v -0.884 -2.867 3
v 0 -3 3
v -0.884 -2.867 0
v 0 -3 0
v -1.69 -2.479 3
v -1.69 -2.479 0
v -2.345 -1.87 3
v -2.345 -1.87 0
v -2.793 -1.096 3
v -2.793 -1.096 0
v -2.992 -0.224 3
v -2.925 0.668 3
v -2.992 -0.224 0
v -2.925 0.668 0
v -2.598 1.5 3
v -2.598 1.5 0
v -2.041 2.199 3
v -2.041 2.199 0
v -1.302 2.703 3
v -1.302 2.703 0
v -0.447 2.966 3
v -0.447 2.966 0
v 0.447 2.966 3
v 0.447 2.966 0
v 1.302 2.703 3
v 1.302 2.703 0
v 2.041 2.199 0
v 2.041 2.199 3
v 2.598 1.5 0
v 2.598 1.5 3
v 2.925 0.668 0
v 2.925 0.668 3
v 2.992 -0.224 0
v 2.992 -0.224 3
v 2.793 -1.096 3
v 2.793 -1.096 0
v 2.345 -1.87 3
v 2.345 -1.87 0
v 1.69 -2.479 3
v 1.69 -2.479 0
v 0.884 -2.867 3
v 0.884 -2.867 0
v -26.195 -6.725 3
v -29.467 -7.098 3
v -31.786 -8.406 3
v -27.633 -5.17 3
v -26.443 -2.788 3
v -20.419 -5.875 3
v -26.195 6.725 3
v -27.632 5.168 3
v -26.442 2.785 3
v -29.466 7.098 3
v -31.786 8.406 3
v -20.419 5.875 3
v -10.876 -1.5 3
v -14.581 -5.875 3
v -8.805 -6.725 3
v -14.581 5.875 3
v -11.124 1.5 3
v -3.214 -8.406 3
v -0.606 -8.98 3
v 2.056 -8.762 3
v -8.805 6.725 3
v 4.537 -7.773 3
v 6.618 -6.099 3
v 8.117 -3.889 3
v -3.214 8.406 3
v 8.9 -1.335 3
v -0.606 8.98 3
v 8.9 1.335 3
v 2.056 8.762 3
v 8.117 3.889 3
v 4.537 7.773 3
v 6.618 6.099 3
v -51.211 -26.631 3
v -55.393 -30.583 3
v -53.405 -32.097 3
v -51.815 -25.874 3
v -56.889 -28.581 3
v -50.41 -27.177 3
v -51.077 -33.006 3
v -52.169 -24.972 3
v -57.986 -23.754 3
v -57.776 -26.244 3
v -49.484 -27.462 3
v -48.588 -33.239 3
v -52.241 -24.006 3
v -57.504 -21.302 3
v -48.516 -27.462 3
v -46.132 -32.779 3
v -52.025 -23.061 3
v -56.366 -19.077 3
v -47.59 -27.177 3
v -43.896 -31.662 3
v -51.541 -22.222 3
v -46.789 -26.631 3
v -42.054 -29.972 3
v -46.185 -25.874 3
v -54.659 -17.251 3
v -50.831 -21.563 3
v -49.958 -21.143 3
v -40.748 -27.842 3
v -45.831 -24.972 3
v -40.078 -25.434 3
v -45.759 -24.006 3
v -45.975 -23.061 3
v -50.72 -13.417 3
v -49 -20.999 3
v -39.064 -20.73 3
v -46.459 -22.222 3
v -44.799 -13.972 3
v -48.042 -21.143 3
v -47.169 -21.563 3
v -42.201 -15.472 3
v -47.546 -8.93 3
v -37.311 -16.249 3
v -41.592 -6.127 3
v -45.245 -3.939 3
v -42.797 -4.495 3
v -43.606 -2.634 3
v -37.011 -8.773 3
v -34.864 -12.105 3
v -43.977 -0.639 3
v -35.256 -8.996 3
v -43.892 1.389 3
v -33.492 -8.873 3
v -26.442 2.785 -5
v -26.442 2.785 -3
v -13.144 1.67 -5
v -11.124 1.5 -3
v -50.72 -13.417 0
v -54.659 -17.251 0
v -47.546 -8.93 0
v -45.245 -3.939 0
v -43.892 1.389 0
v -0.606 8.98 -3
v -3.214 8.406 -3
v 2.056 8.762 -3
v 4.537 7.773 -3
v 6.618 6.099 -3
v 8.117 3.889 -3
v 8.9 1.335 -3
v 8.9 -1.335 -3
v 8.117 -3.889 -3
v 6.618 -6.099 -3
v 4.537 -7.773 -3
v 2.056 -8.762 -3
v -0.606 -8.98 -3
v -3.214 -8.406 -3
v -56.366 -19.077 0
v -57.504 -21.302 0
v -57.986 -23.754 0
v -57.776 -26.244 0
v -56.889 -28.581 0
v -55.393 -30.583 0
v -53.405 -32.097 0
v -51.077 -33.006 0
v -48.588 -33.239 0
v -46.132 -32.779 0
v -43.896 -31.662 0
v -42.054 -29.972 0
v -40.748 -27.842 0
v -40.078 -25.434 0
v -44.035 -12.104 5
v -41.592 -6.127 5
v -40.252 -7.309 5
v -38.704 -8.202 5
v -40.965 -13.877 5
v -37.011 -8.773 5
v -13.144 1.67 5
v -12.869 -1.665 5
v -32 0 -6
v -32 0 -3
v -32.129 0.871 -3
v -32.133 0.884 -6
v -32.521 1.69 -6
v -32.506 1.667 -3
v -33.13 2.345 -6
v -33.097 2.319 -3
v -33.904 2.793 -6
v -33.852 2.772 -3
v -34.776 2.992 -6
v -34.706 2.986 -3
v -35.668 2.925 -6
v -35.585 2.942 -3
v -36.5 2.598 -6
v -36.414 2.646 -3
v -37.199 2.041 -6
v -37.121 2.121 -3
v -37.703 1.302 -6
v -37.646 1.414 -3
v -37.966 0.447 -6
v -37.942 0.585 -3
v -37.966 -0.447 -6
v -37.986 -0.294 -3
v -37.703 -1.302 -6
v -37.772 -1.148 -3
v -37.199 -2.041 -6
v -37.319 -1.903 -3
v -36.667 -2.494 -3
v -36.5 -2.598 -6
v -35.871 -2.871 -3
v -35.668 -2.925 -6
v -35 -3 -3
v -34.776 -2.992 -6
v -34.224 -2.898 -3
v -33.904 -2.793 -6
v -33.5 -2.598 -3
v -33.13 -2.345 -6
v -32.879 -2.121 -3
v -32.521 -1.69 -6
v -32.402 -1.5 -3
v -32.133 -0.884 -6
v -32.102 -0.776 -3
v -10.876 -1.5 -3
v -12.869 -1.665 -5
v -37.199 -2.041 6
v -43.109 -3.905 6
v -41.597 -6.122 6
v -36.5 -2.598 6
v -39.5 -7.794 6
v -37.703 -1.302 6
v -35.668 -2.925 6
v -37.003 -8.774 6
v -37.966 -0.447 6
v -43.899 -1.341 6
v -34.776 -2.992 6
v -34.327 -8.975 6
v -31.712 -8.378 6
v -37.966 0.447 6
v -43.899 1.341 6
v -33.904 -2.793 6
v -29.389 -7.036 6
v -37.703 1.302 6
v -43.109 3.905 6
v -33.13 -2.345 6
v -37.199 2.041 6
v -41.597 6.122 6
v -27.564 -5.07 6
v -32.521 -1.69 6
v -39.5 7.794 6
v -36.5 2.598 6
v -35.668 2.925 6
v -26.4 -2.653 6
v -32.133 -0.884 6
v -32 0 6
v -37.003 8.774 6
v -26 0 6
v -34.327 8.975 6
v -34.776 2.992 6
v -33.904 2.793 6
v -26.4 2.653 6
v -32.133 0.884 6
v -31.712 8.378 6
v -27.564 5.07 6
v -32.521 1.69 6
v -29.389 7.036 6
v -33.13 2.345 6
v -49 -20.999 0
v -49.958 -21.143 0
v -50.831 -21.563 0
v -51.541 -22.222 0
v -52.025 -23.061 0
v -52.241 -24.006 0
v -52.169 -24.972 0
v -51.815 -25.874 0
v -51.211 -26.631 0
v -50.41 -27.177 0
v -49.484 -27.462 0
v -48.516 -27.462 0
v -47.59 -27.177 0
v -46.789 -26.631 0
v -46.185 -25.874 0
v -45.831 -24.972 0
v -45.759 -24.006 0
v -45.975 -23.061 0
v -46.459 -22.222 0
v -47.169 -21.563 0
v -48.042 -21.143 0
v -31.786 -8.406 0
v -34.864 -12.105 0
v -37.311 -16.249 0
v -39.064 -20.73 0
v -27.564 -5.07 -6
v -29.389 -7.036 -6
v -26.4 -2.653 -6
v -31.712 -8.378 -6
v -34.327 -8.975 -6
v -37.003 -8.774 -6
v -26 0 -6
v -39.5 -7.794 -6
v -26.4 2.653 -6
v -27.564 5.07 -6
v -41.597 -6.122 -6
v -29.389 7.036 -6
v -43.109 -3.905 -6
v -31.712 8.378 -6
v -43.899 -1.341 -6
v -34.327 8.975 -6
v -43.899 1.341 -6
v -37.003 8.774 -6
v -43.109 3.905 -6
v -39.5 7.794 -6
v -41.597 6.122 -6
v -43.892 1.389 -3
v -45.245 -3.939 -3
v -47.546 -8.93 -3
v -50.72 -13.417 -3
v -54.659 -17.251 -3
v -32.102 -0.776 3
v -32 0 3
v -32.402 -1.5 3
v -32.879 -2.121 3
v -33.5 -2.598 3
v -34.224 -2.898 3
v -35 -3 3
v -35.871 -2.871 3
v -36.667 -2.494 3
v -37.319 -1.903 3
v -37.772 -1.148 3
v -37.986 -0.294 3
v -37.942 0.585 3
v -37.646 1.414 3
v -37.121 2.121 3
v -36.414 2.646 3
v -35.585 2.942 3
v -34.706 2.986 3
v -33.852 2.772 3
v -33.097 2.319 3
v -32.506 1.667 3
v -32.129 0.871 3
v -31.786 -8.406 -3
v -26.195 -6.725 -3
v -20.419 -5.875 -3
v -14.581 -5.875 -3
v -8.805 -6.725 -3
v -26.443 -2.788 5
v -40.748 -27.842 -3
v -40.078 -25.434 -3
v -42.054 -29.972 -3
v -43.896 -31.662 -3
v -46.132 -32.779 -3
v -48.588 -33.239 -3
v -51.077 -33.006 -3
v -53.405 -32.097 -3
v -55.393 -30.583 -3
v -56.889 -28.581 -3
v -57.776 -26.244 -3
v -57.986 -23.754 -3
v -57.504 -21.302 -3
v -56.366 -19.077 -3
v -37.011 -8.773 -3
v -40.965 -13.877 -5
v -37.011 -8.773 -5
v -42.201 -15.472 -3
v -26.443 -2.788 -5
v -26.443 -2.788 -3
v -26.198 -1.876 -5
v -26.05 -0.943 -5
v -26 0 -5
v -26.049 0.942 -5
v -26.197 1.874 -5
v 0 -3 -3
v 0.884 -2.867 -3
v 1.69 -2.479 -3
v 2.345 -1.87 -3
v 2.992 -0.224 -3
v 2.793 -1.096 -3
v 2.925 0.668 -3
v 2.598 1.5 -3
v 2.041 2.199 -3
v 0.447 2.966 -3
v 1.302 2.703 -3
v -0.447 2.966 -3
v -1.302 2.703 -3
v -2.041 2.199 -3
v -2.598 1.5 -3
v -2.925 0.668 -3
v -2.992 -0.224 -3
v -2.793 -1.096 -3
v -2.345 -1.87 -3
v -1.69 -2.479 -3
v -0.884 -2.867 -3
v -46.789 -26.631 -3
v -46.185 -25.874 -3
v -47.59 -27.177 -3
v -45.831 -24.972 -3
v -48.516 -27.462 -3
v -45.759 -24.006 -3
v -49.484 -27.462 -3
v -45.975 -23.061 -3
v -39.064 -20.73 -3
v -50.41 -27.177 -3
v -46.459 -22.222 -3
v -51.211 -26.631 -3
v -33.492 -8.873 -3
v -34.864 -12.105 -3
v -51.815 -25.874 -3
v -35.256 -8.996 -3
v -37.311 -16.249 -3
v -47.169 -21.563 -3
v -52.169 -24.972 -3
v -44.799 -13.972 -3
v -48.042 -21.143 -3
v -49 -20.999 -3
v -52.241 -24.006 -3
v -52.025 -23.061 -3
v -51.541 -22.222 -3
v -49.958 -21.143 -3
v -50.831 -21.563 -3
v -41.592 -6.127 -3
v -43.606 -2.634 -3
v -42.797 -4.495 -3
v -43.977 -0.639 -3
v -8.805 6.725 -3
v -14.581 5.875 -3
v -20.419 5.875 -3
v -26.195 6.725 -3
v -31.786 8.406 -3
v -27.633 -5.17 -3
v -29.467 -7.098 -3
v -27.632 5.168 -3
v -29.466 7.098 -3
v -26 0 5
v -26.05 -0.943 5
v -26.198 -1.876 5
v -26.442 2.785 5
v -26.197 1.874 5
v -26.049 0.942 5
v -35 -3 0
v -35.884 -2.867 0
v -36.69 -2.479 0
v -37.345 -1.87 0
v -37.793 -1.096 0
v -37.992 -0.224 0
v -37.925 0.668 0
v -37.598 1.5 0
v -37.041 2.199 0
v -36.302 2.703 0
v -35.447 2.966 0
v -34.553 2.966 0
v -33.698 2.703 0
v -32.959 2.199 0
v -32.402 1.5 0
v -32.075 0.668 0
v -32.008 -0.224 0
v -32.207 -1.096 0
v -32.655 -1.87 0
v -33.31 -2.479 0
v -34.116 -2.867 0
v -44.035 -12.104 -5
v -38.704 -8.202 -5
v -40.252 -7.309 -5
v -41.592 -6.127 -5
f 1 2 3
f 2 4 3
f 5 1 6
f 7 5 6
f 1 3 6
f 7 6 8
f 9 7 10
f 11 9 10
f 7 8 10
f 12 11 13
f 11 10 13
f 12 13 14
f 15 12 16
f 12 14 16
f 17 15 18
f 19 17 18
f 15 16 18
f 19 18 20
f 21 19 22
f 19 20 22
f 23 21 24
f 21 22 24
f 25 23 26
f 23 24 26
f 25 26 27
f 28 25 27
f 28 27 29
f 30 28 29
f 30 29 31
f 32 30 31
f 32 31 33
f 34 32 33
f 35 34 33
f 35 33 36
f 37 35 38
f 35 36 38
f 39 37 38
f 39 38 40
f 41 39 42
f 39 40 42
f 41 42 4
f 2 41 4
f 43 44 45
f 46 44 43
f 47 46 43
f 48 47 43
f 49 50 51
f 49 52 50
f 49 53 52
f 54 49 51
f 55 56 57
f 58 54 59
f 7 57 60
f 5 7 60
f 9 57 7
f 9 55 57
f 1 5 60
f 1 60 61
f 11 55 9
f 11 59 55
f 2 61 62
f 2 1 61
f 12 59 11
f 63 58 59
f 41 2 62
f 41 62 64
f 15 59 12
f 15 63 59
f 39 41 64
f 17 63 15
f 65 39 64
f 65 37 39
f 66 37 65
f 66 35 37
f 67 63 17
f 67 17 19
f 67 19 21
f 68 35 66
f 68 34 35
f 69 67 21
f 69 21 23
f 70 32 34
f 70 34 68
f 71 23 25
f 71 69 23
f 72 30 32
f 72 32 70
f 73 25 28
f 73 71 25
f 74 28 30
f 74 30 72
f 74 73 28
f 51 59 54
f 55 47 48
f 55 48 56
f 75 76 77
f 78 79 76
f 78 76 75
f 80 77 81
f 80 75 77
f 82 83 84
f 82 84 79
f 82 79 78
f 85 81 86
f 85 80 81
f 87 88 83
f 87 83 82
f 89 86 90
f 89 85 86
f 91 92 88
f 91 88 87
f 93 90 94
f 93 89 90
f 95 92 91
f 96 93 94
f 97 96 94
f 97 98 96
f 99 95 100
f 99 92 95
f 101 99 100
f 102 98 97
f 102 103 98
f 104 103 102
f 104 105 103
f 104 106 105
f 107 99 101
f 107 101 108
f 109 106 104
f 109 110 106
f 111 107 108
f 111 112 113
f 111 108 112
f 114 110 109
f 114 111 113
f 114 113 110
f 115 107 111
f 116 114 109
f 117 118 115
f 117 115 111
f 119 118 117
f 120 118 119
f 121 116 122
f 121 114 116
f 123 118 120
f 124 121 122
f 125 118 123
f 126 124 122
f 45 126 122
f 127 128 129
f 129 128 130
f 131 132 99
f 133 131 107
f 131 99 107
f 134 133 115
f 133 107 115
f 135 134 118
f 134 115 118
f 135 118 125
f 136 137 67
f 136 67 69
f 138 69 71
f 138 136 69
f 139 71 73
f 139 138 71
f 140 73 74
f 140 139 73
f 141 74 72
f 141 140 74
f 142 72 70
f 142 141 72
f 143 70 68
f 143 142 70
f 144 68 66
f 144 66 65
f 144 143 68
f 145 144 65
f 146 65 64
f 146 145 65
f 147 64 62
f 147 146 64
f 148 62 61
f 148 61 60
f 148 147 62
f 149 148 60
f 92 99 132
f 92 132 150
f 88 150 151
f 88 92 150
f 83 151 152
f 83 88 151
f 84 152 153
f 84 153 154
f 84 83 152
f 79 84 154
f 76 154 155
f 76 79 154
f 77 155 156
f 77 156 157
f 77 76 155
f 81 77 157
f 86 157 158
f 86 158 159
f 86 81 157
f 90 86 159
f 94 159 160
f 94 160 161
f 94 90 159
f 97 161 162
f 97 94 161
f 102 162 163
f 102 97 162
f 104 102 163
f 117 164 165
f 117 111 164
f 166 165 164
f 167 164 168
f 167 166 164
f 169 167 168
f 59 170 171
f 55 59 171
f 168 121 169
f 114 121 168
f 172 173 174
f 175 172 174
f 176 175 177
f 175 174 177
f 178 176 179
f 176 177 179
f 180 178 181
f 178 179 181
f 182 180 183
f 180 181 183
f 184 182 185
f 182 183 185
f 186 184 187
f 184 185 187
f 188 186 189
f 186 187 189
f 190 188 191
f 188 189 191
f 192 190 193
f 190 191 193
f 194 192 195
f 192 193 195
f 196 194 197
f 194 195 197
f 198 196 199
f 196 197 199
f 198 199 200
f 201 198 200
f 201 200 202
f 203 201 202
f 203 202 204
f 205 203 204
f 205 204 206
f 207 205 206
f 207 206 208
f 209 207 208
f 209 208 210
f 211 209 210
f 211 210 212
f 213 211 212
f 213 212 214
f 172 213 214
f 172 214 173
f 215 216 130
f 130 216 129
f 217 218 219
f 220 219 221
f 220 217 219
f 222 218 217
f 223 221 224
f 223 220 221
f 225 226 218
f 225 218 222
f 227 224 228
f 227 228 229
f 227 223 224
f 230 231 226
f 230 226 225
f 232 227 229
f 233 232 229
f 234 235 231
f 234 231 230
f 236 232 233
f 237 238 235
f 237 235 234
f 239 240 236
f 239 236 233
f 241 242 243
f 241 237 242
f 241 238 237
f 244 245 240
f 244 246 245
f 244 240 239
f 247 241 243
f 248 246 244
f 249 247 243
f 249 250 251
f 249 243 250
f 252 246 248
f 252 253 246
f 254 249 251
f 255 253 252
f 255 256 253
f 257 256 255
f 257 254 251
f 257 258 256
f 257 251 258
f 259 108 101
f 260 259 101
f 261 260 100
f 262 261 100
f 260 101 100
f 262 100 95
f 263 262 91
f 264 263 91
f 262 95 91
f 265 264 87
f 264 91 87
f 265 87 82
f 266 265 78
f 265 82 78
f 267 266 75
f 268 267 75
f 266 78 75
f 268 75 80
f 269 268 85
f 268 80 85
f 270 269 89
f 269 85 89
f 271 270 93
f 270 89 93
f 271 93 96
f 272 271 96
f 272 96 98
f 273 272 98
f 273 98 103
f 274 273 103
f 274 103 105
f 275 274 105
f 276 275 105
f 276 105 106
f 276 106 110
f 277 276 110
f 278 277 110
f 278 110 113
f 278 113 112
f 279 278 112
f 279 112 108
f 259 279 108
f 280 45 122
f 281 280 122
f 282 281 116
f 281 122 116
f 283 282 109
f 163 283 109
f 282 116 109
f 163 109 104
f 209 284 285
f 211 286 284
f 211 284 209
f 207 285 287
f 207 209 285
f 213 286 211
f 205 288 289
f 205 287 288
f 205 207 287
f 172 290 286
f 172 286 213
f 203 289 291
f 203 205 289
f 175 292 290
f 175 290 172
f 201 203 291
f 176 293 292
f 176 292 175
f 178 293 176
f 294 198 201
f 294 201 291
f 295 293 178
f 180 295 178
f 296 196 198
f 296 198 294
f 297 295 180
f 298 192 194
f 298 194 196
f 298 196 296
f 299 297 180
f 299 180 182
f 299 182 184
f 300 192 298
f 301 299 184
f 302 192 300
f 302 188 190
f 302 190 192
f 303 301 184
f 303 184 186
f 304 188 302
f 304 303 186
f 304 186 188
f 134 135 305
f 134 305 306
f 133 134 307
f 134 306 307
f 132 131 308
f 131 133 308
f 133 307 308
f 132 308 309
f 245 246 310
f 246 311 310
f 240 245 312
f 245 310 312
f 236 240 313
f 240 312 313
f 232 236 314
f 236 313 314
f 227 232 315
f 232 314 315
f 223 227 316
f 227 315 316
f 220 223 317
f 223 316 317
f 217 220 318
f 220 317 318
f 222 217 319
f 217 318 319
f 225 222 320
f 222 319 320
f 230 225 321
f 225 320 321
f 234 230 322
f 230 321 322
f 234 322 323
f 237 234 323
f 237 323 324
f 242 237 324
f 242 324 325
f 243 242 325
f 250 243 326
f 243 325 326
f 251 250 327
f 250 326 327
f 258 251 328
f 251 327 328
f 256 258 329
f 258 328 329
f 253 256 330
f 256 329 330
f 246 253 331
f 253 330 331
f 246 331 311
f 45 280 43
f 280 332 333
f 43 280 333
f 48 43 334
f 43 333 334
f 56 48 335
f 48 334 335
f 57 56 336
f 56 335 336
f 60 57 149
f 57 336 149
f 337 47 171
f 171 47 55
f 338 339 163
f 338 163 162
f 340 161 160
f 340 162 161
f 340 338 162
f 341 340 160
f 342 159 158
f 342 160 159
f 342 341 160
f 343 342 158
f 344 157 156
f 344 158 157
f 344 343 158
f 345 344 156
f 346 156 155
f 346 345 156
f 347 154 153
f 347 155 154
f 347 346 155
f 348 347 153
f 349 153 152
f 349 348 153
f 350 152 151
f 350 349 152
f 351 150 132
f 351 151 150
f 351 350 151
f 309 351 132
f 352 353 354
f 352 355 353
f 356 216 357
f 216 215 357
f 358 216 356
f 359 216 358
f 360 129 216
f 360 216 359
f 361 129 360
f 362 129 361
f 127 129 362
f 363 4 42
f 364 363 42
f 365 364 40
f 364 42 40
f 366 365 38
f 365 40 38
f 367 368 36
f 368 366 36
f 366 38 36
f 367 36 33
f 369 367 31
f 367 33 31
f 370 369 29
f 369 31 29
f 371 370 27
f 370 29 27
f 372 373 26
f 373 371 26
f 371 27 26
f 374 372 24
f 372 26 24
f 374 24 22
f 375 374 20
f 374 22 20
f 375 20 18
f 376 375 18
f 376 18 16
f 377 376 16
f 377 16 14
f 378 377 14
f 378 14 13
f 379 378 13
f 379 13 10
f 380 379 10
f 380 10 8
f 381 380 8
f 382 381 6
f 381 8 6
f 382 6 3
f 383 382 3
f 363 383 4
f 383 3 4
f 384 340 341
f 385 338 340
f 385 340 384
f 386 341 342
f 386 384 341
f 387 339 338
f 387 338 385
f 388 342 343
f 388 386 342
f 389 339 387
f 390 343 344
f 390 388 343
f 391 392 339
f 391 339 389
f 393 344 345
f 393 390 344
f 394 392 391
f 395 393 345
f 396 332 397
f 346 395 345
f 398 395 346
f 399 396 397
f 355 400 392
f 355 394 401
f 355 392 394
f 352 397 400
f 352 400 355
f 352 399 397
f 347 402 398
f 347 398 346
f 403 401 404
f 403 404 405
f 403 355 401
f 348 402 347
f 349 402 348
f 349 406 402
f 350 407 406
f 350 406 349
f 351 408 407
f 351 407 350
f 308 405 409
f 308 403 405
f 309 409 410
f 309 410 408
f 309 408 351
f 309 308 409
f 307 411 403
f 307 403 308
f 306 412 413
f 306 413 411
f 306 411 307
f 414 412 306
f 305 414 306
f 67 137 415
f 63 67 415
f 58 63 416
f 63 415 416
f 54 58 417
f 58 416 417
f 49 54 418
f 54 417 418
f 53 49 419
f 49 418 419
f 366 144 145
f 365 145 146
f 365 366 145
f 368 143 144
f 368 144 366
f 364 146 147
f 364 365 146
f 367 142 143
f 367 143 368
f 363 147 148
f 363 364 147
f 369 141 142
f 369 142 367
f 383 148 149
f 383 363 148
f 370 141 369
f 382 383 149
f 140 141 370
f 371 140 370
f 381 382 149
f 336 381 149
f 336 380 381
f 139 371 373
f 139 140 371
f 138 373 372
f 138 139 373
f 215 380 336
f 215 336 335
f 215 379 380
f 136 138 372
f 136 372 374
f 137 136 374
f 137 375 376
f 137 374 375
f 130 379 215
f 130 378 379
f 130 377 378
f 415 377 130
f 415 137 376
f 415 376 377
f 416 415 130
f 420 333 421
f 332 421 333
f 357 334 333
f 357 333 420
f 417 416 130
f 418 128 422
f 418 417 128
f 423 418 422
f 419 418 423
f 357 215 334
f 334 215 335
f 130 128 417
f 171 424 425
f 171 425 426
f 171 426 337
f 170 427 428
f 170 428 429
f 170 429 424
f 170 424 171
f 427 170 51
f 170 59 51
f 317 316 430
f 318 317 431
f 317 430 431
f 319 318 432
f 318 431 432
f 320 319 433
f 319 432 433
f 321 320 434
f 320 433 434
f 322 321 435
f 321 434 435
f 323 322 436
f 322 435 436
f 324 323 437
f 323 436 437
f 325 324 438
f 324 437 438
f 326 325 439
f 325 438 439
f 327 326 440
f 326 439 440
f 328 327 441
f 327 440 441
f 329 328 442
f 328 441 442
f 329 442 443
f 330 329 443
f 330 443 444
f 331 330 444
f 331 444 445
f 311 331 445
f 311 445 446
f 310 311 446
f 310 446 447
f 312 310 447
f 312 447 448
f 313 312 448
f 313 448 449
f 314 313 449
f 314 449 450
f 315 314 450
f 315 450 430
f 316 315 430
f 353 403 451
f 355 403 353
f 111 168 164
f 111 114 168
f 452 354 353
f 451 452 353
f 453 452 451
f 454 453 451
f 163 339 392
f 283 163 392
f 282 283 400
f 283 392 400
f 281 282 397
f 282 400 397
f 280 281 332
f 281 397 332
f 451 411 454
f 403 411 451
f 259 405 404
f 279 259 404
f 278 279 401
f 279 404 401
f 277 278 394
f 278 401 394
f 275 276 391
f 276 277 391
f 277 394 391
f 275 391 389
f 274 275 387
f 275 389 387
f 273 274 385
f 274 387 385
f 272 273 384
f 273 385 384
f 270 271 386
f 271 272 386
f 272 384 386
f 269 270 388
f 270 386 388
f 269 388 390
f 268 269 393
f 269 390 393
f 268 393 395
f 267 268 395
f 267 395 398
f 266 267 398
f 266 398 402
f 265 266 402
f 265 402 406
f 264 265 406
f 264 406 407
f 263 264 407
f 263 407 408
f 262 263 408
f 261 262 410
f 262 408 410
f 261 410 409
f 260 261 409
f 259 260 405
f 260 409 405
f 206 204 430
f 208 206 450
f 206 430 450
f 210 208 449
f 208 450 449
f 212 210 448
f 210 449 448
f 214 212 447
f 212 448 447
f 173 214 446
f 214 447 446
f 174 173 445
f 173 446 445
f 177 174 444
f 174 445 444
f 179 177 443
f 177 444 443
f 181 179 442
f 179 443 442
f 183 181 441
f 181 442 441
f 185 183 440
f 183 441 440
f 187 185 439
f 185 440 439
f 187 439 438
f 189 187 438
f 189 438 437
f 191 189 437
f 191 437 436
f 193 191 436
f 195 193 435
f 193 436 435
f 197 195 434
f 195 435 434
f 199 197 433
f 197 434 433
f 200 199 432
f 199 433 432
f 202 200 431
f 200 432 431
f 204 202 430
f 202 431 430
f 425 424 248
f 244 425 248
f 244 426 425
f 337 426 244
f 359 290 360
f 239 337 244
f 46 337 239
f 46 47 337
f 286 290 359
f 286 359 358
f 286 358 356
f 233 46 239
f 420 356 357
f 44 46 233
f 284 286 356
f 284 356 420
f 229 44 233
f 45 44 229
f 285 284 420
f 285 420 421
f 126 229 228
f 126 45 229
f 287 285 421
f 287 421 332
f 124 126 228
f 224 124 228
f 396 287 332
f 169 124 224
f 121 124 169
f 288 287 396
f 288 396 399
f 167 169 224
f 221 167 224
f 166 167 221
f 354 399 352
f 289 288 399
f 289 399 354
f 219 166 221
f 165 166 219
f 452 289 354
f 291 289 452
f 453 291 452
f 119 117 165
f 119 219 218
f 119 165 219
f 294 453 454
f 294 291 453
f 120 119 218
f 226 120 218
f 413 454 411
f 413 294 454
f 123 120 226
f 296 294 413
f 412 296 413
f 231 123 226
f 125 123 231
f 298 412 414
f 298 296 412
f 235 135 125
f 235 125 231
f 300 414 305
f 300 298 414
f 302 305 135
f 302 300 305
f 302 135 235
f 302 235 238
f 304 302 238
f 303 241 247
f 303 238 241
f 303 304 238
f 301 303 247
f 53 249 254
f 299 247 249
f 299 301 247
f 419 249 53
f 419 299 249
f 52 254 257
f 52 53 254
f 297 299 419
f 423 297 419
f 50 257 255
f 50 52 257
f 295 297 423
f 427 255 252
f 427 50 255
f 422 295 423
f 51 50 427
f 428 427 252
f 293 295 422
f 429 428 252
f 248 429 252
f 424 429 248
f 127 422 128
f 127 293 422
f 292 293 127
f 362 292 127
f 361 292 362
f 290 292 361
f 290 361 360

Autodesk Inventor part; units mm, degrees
ref_plane "YZ Plane" through (0, 0, 0) normal (1, 0, 0) x (0, 1, 0)
ref_plane "XZ Plane" through (0, 0, 0) normal (0, 1, 0) x (-1, 0, 0)
ref_plane "XY Plane" through (0, 0, 0) normal (0, 0, 1) x (1, 0, 0)
sketch "Base" plane through (0, 0, 0) normal (0, 0, 1) x (1, 0, 0)
  line L0 (-54.6, 0) -> (19.6, 0) construction
  circle A0 centre (0, 0) radius 9
  line L1 (0, 0) -> (-35, 0) construction
  circle A1 centre (-35, 0) radius 9
  arc A2 (-31.7857, 8.4064) -> (-3.2143, 8.4064) centre (-17.5, 45.7684) ccw
  arc A3 (-3.2143, -8.4064) -> (-31.7857, -8.4064) centre (-17.5, -45.7684) ccw
  dimension "d0" = 18
  dimension "d1" = 35
  dimension "d2" = 18
  dimension "d3" = 40
extrude "BaseFeature" add sketch "Base" along normal blind 3
sketch "Sketch2" plane through (0, 0, 3) normal (0, 0, 1) x (1, 0, 0)
  arc A0 (-31.7857, 8.4064) -> (-31.7857, -8.4064) centre (-35, 0) ccw projected
  arc A1 (-3.2143, -8.4064) -> (-3.2143, 8.4064) centre (0, 0) ccw projected
hole "BaseHolesFeature" at (-35, 0, 3) at (0, 0, 3) direction (0, 0, -1) diameter 6 end through all
sketch "Extension" plane through (0, 0, 3) normal (0, 0, 1) x (1, 0, 0)
  arc A0 (-31.7857, 8.4064) -> (-31.7857, -8.4064) centre (-35, 0) ccw construction
  line L0 (-35, 0) -> (-49, -24.2487) construction
  line L1 (-90.0286, 0) -> (25.5048, 0) construction
  circle A1 centre (-49, -24.2487) radius 9
  arc A2 (-54.6593, -17.2507) -> (-43.8901, 1.4021) centre (-73.5238, 6.0759) ccw
  arc A3 (-31.7857, -8.4064) -> (-40.0784, -25.4338) centre (-10.3396, -29.3841) ccw
  arc A4 (-43.8901, 1.4021) -> (-31.7857, -8.4064) centre (-35, 0) ccw
  dimension "d13" = 120
  dimension "d14" = 28
  dimension "d24" = 18
  dimension "d29" = 30
extrude "ExtensionFeature" add sketch "Extension" against normal up to surface (3 mm away)
sketch "ExtensionHole" plane through (0, 0, 0) normal (0, 0, -1) x (-1, 0, 0)
  arc A0 (40.0784, -25.4338) -> (54.6593, -17.2507) centre (49, -24.2487) ccw projected
hole "ExtensionHoleFeature" at (-49, -24.2487, 0) direction (0, 0, 1) diameter 6.5 end through all
sketch "MiddleRaise" plane through (0, 0, 3) normal (0, 0, 1) x (1, 0, 0)
  circle A0 centre (-35, 0) radius 3 projected
  circle A1 centre (-35, 0) radius 9
  point P0 (-31.7857, 8.4064)
extrude "MiddleRaiseFeature" add sketch "MiddleRaise" along normal blind 3
sketch "TopRidges" plane through (0, 0, 3) normal (0, 0, 1) x (1, 0, 0)
  arc A0 (-54.6593, -17.2507) -> (-40.0784, -25.4338) centre (-49, -24.2487) ccw construction
  arc A1 (-3.2143, -8.4064) -> (-3.2143, 8.4064) centre (0, 0) ccw construction
  arc A2 (-43.8901, 1.4021) -> (-31.7857, -8.4064) centre (-35, 0) ccw construction
  arc A3 (-31.7857, -8.4064) -> (-31.7857, 8.4064) centre (-35, 0) ccw construction
  line L0 (-35, 0) -> (-49, -24.2487) construction
  line L1 (-40.5981, -3.6962) -> (-35.4019, -6.6962)
  line L2 (-35.4019, -6.6962) -> (-42.201, -15.4724)
  line L3 (-42.201, -15.4724) -> (-44.799, -13.9724)
  line L4 (-44.799, -13.9724) -> (-40.5981, -3.6962)
  arc A4 (-40.0784, -25.4338) -> (-54.6593, -17.2507) centre (-49, -24.2487) ccw construction
  line L5 (-35, 0) -> (-11, 0) construction
  arc A5 (-3.2143, 8.4064) -> (-3.2143, -8.4064) centre (0, 0) ccw construction
  line L6 (-29, 3) -> (-29, -3)
  line L7 (-29, -3) -> (-10.8759, -1.5)
  line L8 (-10.8759, -1.5) -> (-11.1241, 1.5)
  line L9 (-11.1241, 1.5) -> (-29, 3)
  point P0 (-43.5, -14.7224)
  point P1 (-38, -5.1962)
  point P2 (-29, 0)
  dimension "d30" = 3
  dimension "d31" = 6
  dimension "d37" = 6
  dimension "d39" = 11
  dimension "d40" = 11
  dimension "d41" = 6
  dimension "d42" = 6
  dimension "d43" = 3
extrude "TopRidgesFeature" add sketch "TopRidges" along normal blind 2
chamfer "TopRidgeChamfersFeature" distance 2 angle 45 2 edges at (-43.5, -14.7224, 5) (-11, 0, 5)
mirror "Mirror2" about plane through (-17.5, 0, 0) normal (0, 0, -1)
equation "\"d41\" = d37"
equation "\"d42\" = d31"
equation "\"d43\" = d30"
properties part number "ElbowSubConnector"
